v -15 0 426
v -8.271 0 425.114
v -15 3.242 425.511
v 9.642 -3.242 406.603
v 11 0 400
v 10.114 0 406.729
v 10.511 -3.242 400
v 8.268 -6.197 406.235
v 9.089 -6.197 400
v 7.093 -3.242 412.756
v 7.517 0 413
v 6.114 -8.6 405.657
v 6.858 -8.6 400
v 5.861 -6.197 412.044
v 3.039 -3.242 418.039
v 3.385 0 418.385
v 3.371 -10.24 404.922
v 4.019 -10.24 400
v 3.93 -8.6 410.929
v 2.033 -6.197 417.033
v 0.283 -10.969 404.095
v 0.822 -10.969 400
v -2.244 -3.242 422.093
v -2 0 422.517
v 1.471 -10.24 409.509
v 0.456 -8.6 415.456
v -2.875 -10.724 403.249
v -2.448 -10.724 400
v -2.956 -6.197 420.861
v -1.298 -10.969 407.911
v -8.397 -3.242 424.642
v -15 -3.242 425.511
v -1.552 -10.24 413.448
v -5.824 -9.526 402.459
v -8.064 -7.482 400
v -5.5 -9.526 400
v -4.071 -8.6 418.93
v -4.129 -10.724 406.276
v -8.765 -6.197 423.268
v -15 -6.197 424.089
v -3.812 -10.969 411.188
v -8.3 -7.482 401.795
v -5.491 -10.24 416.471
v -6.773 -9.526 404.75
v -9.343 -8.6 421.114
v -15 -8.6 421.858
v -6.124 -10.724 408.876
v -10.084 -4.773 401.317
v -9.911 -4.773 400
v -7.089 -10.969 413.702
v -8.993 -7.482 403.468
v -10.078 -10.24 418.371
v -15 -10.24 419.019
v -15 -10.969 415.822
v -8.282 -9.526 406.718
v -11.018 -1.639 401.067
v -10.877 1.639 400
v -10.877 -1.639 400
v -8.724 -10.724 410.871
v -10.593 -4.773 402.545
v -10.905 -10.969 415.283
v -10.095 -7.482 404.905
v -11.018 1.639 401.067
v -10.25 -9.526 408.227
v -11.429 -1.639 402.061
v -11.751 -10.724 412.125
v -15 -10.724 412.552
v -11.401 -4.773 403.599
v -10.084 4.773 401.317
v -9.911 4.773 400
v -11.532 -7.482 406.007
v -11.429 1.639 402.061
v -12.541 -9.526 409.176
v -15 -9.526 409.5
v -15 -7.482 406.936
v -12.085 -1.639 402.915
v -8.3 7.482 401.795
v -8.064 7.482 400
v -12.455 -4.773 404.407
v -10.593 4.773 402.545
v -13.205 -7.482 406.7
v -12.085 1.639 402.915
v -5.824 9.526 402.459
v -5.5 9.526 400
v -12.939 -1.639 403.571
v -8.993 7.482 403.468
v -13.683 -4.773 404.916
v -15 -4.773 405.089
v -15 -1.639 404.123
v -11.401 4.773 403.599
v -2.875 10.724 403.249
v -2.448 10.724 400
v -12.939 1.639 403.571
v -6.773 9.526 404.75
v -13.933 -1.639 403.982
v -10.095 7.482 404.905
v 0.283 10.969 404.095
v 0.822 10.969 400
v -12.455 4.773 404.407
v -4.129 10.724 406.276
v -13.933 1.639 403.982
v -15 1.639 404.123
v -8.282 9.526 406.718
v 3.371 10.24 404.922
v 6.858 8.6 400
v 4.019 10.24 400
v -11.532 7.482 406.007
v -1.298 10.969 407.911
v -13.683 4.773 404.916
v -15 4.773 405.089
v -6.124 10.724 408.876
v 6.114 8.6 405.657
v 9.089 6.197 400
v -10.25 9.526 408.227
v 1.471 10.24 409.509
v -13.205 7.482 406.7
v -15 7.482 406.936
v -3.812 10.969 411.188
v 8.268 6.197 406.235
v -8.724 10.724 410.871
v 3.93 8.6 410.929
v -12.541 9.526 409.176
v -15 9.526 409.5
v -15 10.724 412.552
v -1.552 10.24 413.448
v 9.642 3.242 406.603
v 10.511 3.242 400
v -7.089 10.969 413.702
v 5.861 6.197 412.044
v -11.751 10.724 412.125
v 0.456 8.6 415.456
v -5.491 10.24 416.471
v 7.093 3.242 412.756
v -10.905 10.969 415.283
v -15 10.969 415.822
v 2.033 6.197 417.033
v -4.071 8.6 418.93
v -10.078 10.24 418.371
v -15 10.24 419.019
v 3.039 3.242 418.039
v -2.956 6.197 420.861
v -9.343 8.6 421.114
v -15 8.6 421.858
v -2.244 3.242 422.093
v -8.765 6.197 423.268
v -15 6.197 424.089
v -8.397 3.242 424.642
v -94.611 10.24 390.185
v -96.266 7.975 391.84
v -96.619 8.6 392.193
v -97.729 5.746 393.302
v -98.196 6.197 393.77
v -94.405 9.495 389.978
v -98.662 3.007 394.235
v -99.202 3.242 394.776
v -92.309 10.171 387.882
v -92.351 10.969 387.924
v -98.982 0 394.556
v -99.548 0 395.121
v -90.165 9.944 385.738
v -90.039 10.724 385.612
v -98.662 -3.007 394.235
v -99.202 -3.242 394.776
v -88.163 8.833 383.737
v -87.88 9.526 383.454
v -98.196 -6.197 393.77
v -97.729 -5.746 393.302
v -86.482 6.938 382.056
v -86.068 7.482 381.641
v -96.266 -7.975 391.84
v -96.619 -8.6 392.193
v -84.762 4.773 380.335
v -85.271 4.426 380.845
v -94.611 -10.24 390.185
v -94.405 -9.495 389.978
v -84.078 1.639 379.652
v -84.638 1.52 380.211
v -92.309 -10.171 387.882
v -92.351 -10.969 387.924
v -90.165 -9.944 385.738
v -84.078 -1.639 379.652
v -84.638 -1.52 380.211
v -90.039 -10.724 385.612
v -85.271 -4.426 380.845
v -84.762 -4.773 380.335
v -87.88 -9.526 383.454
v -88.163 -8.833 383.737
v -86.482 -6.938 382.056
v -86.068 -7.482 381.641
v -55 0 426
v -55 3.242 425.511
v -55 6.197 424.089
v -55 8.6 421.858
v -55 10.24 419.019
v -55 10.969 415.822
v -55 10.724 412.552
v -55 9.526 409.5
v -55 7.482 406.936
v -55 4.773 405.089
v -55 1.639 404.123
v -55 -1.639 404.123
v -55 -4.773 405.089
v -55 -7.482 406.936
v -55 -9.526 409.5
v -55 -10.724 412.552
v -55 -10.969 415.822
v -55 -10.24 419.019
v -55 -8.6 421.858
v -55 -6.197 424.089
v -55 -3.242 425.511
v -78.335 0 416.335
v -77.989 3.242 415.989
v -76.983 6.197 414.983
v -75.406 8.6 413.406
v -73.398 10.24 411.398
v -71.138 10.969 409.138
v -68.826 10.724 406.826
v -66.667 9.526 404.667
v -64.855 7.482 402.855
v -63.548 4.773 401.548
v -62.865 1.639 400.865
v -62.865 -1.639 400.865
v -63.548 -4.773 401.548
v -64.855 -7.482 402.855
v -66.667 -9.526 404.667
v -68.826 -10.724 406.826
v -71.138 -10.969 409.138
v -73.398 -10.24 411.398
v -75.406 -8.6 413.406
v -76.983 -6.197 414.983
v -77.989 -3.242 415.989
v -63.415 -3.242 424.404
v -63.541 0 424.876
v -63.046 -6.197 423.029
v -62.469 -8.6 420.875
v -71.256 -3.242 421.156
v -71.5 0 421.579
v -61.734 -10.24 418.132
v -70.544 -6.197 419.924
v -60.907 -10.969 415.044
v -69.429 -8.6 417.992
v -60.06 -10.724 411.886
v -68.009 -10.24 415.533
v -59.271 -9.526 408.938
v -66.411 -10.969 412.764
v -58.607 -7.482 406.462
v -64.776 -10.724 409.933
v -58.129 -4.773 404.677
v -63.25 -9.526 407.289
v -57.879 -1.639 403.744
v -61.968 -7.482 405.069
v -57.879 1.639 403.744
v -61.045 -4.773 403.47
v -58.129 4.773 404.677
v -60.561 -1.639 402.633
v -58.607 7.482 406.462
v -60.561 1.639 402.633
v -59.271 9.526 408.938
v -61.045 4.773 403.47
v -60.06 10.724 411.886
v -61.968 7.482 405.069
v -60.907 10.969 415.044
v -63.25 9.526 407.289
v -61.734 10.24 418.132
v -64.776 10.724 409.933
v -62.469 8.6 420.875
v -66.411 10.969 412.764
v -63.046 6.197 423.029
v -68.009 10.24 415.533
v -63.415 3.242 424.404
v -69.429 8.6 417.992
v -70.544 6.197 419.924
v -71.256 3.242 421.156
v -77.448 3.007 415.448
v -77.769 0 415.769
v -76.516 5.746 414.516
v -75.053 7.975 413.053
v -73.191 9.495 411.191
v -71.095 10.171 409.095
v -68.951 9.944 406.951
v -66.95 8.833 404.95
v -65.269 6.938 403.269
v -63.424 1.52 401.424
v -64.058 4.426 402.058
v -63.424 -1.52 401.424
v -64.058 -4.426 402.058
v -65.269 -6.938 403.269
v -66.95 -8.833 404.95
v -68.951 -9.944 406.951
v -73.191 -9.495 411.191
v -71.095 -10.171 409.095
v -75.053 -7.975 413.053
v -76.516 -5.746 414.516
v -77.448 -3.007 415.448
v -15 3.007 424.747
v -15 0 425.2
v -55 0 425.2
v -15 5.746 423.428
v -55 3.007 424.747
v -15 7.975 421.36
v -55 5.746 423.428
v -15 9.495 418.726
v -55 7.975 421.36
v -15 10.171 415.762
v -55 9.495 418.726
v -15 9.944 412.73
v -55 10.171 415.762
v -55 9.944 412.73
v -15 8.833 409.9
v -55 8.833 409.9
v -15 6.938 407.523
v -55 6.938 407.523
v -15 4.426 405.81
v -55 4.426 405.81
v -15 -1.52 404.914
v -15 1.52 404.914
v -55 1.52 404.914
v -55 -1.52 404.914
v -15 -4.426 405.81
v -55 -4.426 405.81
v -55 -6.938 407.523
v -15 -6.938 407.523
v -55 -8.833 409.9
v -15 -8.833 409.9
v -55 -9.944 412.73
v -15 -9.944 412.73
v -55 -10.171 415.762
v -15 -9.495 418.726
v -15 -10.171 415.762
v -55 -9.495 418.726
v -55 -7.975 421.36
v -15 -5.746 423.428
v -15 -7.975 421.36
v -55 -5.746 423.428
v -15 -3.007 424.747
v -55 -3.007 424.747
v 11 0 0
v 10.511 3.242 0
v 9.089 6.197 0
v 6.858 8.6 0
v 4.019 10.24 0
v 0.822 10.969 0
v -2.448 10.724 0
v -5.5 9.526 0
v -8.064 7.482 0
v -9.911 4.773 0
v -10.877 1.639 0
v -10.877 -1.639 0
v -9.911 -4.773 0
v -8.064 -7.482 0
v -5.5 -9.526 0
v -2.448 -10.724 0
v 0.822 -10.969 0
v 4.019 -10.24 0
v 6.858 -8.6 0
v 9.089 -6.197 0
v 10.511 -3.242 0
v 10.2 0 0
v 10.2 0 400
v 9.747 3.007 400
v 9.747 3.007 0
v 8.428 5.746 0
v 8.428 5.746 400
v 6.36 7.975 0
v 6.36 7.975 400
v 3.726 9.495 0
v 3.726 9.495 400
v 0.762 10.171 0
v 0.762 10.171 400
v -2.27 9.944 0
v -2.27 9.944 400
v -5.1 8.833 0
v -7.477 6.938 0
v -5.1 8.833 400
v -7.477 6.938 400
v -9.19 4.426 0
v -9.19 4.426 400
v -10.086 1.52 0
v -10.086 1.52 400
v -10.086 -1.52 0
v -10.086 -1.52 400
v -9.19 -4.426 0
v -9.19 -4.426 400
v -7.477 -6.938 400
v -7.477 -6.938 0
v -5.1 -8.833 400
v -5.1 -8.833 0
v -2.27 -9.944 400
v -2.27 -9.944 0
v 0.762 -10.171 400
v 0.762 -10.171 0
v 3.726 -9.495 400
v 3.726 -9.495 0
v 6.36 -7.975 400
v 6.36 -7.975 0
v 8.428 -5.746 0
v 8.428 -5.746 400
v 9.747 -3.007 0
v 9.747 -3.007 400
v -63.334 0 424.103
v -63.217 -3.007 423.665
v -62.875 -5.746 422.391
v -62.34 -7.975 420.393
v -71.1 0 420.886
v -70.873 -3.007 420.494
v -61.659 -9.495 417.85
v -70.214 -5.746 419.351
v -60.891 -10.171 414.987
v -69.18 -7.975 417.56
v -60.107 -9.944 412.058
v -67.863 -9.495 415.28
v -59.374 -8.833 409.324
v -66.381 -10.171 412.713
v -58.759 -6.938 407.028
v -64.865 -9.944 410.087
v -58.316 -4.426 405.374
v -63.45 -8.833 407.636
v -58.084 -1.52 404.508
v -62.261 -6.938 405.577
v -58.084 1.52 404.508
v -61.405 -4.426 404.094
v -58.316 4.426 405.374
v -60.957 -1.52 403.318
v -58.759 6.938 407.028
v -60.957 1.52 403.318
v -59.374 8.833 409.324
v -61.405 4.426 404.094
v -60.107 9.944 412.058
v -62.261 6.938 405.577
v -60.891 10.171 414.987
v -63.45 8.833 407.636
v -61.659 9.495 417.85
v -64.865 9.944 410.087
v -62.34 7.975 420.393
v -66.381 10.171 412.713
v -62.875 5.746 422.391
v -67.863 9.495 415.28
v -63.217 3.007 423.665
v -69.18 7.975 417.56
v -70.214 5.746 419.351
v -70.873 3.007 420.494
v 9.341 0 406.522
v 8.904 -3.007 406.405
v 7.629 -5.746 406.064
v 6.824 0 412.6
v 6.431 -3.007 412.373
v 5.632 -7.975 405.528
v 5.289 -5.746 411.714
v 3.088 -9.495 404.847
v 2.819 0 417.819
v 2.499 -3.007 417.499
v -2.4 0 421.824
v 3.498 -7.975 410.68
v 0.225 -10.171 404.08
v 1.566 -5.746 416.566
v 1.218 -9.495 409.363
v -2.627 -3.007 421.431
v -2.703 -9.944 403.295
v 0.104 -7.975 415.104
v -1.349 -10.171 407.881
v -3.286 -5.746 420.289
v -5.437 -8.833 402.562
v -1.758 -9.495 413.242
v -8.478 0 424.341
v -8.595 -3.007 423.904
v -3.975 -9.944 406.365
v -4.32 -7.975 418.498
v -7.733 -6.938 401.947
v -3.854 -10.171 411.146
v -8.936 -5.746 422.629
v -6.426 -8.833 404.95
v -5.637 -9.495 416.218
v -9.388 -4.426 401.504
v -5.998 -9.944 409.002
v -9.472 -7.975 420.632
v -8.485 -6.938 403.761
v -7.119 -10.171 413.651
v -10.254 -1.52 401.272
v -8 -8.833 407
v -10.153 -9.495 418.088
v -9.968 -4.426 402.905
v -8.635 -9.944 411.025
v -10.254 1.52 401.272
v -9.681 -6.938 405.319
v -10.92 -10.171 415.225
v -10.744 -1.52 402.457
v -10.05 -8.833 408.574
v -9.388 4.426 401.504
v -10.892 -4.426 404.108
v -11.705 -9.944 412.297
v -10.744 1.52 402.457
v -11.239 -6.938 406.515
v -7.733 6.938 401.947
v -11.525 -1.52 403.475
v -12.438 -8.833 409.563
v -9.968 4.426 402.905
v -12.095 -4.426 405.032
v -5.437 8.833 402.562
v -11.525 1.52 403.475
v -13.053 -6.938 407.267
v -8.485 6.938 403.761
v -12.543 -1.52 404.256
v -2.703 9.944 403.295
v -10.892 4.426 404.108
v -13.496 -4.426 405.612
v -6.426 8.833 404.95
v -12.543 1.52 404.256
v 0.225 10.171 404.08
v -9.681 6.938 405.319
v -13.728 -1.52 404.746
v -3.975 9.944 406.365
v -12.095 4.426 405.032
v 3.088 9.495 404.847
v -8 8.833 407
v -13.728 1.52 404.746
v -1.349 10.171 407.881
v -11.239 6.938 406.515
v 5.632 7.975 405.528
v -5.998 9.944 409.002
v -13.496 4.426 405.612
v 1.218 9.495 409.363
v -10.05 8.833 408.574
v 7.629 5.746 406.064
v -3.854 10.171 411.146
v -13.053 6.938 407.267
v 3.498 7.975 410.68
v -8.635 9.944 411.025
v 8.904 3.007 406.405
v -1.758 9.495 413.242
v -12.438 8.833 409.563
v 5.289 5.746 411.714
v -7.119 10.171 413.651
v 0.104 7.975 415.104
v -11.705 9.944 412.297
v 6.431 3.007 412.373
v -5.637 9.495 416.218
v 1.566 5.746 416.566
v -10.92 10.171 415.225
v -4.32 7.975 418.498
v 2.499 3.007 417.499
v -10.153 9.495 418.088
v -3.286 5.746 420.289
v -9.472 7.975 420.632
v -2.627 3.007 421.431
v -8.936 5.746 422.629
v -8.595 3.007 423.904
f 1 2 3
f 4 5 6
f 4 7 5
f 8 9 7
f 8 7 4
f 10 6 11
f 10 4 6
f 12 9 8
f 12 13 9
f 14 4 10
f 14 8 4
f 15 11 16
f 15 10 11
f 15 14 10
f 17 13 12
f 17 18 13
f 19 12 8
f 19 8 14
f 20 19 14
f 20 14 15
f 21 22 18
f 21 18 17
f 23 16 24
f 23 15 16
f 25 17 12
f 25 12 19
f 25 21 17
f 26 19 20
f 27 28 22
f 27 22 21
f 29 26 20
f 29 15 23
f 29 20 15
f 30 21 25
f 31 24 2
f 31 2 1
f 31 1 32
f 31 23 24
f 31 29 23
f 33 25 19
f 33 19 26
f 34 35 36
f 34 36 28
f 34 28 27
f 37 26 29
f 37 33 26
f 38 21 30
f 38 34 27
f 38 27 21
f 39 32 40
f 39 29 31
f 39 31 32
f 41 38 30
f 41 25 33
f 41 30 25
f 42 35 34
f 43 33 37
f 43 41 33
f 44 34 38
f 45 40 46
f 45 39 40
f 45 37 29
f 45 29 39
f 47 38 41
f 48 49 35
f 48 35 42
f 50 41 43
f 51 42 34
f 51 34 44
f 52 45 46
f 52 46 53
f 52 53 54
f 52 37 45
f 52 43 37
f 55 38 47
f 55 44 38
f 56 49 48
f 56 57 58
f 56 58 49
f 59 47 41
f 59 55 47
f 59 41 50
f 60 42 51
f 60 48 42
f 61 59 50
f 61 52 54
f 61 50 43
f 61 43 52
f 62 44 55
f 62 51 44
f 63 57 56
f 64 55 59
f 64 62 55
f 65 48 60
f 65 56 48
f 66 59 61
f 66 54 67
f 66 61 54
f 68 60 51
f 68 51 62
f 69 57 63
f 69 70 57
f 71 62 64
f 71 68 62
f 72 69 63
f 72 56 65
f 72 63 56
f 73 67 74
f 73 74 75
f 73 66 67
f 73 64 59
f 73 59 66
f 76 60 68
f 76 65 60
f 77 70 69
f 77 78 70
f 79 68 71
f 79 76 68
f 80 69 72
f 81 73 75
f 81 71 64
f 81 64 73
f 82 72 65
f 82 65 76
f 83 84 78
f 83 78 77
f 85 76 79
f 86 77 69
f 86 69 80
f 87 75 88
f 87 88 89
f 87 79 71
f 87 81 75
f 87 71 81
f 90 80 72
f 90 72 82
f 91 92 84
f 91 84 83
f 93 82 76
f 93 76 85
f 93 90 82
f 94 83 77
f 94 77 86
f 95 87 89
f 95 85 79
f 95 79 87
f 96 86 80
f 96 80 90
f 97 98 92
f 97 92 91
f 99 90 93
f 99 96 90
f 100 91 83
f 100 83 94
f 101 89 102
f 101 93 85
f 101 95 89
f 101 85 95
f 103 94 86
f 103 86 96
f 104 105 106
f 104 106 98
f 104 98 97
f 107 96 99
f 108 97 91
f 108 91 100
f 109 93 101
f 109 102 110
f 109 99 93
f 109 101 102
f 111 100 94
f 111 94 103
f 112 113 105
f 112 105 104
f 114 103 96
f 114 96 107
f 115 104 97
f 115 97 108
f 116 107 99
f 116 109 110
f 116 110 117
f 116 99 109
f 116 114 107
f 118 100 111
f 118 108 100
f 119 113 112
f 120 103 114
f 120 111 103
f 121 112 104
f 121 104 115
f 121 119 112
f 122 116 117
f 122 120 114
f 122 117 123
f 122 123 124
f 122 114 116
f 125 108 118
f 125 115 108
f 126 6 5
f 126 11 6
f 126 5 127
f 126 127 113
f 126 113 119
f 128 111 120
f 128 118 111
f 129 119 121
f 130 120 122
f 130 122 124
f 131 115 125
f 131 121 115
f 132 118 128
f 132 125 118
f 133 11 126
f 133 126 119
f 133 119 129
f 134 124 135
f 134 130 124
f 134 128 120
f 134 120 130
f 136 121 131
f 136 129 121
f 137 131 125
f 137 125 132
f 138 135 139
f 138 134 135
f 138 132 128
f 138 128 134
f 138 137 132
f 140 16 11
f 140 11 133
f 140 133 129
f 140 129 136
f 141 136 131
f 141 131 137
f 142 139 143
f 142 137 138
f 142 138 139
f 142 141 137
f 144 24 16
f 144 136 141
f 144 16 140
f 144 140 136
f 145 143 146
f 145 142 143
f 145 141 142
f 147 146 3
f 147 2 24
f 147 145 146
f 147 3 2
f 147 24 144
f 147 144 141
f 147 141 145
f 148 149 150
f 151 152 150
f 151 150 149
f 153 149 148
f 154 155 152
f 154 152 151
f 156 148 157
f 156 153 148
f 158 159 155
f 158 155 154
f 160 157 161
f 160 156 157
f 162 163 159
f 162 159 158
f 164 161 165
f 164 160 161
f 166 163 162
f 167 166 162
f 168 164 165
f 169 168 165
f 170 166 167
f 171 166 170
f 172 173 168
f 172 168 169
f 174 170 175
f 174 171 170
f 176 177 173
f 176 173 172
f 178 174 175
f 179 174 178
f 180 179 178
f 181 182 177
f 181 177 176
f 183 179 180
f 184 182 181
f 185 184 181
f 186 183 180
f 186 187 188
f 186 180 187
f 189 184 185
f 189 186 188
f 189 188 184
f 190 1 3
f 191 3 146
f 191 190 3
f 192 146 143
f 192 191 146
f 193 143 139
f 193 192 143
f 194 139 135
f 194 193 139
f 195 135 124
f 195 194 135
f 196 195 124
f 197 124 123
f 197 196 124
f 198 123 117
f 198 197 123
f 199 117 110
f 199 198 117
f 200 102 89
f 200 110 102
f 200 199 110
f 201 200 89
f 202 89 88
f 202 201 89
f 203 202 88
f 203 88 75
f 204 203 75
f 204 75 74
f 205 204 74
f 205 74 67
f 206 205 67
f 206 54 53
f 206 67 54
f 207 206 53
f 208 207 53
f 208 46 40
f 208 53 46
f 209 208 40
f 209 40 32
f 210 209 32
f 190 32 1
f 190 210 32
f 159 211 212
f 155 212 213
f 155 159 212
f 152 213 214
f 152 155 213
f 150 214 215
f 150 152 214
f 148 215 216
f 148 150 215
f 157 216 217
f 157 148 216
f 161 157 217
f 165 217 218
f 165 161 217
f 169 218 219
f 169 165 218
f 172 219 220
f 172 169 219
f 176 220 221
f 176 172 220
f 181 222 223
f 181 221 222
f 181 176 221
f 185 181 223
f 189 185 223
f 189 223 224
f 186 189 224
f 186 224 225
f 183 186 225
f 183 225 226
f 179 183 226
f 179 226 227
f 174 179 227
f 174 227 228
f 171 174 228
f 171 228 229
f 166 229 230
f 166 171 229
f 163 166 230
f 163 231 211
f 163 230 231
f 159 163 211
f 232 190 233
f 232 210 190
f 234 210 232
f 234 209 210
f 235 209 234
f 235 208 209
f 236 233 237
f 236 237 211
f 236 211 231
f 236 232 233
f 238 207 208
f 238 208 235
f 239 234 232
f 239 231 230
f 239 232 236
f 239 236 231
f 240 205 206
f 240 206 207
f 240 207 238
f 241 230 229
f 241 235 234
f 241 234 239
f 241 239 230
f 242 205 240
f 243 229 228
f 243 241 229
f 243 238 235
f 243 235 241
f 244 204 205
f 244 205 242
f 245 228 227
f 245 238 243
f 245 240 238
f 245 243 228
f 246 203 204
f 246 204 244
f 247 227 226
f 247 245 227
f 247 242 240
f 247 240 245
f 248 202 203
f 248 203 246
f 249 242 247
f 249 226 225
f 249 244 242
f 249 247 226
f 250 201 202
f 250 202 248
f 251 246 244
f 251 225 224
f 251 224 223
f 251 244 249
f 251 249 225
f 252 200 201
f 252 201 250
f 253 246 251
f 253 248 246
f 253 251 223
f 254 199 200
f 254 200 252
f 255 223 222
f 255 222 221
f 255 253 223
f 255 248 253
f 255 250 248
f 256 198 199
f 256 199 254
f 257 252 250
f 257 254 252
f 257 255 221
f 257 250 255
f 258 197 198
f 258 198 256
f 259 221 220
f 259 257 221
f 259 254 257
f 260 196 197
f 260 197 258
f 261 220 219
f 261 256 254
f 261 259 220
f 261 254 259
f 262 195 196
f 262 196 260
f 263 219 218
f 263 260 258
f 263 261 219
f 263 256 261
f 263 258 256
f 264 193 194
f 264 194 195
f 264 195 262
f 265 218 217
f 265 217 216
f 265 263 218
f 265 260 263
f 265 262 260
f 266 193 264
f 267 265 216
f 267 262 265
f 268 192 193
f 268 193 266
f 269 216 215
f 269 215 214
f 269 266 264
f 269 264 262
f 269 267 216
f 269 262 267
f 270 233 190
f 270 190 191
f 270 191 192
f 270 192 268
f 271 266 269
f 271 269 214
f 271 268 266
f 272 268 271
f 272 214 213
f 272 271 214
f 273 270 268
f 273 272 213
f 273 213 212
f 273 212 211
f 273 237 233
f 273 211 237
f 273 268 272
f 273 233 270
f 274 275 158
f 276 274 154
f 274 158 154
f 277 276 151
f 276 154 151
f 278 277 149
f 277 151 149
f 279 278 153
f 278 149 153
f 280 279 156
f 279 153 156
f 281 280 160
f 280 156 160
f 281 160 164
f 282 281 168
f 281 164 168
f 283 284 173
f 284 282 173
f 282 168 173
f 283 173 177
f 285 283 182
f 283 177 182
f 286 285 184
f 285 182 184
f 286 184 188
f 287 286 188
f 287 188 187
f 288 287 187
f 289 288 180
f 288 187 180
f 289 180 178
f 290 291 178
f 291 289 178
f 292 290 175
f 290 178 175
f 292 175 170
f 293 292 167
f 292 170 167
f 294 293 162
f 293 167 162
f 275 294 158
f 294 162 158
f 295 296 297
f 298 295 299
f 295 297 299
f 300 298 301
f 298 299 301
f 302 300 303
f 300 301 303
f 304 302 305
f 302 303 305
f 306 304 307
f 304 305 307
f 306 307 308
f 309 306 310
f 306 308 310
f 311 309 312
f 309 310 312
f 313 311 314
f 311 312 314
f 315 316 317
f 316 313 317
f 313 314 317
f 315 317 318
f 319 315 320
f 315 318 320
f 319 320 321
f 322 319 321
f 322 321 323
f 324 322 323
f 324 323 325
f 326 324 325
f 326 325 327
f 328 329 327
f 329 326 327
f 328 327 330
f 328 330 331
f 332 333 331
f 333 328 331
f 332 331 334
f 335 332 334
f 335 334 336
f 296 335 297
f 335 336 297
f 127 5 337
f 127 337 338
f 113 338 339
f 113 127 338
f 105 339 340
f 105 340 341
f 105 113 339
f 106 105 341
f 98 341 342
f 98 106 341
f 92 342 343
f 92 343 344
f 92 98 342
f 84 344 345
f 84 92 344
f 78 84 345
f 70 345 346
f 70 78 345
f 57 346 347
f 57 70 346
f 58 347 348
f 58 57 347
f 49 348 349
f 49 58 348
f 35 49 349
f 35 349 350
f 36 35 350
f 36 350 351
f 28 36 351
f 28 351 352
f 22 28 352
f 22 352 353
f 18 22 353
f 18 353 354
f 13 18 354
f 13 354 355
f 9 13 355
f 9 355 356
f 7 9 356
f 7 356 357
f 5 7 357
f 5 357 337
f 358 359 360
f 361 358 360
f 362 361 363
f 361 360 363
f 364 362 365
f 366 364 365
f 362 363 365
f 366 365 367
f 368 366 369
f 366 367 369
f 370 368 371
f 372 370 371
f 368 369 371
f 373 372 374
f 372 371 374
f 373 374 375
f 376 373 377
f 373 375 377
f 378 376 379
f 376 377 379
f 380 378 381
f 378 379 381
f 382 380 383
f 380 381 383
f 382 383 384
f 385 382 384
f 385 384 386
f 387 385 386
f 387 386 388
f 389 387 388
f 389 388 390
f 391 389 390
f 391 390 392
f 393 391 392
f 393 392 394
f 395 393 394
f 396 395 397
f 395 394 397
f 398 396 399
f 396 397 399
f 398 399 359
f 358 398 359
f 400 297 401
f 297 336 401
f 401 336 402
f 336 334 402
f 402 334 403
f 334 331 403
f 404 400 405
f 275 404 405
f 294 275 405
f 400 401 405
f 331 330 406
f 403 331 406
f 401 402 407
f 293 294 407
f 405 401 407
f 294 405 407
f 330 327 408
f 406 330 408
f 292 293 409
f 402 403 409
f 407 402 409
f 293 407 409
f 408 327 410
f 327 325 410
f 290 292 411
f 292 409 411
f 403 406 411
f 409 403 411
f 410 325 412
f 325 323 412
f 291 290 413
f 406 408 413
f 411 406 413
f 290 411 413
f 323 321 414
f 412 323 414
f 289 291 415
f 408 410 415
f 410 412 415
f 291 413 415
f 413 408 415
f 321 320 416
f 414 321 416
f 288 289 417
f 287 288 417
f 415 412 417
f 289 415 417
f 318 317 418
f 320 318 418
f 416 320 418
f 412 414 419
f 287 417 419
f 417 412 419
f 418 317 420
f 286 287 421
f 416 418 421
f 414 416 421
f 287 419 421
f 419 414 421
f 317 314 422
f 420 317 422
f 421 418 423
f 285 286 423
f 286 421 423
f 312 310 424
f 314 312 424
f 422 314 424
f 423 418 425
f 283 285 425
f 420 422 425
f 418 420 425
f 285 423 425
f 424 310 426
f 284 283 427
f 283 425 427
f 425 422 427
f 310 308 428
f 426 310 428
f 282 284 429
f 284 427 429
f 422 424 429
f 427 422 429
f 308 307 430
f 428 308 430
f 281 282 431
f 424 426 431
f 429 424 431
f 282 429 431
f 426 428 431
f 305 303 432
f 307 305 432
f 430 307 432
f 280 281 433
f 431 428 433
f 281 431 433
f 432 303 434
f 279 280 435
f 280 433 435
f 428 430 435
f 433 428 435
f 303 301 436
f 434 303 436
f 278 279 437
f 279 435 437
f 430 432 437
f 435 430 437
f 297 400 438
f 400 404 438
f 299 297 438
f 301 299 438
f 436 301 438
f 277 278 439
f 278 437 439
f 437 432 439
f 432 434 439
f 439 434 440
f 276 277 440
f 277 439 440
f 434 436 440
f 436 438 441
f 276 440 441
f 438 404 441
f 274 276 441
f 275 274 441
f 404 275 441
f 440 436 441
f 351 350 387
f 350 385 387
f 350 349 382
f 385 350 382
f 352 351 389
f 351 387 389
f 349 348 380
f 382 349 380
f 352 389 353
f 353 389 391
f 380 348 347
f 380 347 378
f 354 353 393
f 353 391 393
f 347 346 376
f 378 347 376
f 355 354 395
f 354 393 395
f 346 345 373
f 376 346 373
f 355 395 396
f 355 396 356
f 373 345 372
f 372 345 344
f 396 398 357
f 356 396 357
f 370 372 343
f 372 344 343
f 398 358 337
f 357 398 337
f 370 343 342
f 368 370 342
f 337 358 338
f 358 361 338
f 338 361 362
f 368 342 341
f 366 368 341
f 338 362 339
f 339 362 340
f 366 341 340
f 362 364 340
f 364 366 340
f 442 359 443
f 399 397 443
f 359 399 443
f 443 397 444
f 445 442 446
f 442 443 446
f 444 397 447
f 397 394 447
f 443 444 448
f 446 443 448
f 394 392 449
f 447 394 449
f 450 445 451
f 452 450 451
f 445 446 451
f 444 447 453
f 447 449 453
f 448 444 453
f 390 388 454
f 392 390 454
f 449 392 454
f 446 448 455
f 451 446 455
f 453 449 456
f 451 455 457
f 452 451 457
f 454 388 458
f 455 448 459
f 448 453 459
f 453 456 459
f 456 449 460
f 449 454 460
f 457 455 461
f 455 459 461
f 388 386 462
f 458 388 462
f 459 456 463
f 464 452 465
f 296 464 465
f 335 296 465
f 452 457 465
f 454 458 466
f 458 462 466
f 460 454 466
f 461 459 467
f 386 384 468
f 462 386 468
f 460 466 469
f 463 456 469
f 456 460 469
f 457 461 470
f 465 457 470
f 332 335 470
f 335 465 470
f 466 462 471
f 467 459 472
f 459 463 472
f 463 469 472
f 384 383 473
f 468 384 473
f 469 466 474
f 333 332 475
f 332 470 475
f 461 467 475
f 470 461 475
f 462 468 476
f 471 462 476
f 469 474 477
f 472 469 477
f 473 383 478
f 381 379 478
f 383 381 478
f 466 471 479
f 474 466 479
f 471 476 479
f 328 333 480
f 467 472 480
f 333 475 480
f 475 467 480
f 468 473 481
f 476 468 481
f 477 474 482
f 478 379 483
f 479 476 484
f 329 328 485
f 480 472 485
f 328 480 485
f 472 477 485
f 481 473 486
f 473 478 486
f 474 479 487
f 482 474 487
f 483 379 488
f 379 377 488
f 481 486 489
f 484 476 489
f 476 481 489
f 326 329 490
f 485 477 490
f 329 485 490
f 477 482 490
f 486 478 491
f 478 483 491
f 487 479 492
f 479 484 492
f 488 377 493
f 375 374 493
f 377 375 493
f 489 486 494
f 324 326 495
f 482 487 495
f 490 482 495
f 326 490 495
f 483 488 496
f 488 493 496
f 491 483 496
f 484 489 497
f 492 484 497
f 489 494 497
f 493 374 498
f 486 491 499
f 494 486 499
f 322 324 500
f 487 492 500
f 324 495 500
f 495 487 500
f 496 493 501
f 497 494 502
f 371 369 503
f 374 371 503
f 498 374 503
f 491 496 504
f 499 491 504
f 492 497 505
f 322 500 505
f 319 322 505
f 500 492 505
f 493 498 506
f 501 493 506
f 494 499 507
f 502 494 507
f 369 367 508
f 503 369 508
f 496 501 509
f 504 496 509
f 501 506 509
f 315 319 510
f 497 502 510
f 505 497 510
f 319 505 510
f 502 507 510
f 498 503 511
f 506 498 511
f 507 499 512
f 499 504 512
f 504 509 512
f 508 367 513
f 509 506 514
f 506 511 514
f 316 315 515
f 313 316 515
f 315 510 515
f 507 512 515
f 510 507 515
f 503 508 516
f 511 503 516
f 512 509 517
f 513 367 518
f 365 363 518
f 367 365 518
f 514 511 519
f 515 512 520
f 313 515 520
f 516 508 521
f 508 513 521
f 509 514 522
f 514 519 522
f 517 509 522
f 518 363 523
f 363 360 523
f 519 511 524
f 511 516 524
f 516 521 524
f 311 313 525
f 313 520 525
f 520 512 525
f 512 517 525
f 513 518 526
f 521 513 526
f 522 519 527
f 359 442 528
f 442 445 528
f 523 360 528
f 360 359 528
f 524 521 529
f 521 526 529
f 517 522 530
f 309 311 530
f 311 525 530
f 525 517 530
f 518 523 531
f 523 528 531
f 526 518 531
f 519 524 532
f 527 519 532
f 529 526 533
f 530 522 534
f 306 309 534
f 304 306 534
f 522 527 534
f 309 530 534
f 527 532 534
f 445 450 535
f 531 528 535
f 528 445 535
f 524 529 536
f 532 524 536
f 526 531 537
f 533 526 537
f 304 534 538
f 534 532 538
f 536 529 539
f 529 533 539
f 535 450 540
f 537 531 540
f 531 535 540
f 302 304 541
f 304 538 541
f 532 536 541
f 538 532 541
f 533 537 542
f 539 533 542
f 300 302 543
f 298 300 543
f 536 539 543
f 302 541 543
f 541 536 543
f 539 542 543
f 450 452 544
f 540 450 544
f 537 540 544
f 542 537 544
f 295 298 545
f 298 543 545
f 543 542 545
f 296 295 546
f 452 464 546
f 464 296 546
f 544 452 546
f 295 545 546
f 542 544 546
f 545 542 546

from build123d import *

# Parameters (mm, degrees)
F1_R = 11
F3_T = -0.8


with BuildPart() as f2:
    # F2: sweep along a path in F0
    with BuildLine(Plane.XZ) as f2_path:
        Line((0, 0), (0, 400))
        ThreePointArc((0, 400), (-4.3933982822, 410.6066017178), (-15, 415))
        Line((-15, 415), (-55, 415))
        ThreePointArc((-55, 415), (-63.419035512, 413.3253497152), (-70.5563491861, 408.5563491861))
        Line((-70.5563491861, 408.5563491861), (-91.7695526217, 387.3431457505))
    # F1 (on Top) → F2 (sweep)
    with BuildSketch(Plane.XY):
        Circle(F1_R)
    sweep(path=f2_path.line)

    # F3
    f3_openings = [f2.faces().sort_by_distance(p)[0] for p in [
        (-91.769553, 0, 387.343146),
        (0, 0, 0),
    ]]
    offset(amount=F3_T, openings=f3_openings)


solid = f2.part
